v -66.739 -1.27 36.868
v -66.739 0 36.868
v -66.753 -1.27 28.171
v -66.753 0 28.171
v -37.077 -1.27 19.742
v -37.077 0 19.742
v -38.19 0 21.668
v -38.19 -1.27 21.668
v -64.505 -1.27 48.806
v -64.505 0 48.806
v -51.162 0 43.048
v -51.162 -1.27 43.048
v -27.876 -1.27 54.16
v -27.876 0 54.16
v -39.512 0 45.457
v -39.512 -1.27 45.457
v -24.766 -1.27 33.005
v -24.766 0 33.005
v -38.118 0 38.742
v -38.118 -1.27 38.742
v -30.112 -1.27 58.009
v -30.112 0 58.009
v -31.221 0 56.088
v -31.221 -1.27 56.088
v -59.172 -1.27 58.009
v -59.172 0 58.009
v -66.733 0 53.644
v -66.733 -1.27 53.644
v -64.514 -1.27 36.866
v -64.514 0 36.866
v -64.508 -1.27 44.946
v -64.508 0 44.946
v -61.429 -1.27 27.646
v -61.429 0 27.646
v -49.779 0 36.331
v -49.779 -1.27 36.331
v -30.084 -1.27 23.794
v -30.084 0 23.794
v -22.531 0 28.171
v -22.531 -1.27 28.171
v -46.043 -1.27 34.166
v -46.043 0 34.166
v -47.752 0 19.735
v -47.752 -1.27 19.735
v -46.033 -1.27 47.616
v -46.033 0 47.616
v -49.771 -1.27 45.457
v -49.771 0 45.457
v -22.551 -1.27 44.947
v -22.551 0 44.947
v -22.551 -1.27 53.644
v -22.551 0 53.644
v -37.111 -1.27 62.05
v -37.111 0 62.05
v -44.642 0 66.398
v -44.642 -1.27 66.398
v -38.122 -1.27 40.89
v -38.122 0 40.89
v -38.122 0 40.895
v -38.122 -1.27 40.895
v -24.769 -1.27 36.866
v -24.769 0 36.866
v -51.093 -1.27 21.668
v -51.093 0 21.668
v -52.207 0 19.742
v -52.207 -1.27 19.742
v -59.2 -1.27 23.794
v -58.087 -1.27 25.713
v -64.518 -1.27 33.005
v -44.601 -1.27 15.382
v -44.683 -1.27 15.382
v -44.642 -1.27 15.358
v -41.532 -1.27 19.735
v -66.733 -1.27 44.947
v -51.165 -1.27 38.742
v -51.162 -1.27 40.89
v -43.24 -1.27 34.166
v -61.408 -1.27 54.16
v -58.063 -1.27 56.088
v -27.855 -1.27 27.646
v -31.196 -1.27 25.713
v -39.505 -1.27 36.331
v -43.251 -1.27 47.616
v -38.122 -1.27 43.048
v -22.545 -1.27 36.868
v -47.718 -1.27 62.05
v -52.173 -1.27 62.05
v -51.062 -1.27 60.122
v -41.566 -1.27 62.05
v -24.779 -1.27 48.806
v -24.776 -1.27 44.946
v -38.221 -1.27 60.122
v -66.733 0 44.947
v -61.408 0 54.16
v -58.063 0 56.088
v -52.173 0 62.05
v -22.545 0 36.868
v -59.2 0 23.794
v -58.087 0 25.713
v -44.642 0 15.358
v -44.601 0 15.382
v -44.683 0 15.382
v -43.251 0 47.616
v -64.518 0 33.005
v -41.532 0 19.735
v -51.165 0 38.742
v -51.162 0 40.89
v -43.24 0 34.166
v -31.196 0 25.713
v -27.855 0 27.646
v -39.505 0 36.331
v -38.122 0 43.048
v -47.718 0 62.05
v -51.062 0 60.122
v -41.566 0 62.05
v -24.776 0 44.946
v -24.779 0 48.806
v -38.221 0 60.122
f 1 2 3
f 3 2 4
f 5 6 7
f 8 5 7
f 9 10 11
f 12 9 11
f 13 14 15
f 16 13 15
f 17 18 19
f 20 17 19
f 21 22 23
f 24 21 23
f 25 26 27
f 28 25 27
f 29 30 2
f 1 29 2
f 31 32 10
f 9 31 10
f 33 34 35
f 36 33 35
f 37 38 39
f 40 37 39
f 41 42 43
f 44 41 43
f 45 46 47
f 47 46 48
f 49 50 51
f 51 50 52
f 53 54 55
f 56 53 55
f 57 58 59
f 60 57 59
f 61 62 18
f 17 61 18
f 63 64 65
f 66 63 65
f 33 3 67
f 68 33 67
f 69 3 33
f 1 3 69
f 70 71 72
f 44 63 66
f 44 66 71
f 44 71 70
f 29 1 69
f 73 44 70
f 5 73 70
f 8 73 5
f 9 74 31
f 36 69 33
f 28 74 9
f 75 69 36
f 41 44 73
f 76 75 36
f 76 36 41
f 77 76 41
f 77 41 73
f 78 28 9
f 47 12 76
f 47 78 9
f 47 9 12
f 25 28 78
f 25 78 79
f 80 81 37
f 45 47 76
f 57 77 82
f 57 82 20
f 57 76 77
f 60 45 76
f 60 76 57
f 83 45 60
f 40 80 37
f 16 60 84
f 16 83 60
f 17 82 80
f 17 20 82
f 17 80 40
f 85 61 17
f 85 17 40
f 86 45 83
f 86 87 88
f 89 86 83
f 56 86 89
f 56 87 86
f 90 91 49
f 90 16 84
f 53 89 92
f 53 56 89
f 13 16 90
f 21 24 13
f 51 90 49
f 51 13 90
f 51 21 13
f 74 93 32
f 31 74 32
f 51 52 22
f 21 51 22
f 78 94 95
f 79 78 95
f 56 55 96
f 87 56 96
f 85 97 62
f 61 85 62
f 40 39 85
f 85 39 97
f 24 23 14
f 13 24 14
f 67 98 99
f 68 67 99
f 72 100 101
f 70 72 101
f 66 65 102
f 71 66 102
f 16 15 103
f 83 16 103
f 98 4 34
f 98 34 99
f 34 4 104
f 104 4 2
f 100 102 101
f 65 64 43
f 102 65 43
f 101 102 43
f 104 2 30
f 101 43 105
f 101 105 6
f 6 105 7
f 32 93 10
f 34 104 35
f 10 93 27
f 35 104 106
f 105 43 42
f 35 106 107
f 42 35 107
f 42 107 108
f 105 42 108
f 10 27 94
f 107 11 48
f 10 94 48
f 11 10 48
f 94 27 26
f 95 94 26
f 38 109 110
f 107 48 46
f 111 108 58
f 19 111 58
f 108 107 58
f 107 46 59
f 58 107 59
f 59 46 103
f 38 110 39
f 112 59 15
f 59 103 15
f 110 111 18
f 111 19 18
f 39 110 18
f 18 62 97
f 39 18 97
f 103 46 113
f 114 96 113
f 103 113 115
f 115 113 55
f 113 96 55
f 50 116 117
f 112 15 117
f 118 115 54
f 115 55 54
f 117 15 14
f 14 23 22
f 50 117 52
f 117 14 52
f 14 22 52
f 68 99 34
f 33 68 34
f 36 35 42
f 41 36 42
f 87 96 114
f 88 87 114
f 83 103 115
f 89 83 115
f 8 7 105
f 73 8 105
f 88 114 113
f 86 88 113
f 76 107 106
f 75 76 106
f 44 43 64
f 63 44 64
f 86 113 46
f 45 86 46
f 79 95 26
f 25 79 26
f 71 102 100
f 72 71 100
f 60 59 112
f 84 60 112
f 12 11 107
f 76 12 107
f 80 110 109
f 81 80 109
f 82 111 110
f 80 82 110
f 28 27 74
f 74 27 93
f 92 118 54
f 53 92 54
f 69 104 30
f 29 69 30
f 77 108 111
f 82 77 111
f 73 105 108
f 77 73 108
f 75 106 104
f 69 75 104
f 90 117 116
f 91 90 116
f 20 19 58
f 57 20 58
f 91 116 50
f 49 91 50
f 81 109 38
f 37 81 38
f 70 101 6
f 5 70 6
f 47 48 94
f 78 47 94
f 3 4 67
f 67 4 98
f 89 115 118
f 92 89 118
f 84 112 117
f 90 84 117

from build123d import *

# Parameters (mm, degrees)
F1_DEPTH = 1.27


# Not quite as in the source:
# - ends of sketch curves that miss each other by under 0.0002 mm in the source are joined


with BuildPart() as f1:
    # F0 (on Front) → F1 (new body)
    with BuildSketch(Plane.XZ):
        Polygon((-44.6418710053, 40.8897735178), (-44.6418710053, 33.3539977979), (-44.6297971524, 33.3609944811), (-43.2404409197, 34.166113231), (-39.5050764062, 36.3307215128), (-38.1157201735, 37.1358402628), (-38.1182953477, 38.7416174302), (-38.1217403313, 40.8897735313), (-38.1217487156, 40.8950016529), align=None)
        Polygon((-44.6539448582, 33.3609944811), (-44.6418710053, 33.3539977979), (-44.6418710053, 40.8897735178), (-51.161993295, 40.8950016529), (-51.161993295, 40.8897735178), (-51.1654466629, 38.7416174302), (-51.1680218371, 37.1358402628), (-49.7786656044, 36.3307215128), (-46.0433010909, 34.166113231), align=None)
        Polygon((-44.6418710053, 40.8897735178), (-38.1217487156, 40.8950016529), (-38.1217487156, 40.9002297812), (-38.1217487156, 43.0483886446), (-38.1217487156, 44.6541678769), (-39.5123943237, 45.4570574931), (-43.2512253972, 47.6156726199), (-44.6418710053, 48.418562236), align=None)
        Polygon((-51.161993295, 40.8950016529), (-44.6418710053, 40.8897735178), (-44.6418710053, 48.418562236), (-46.0325166134, 47.6156726199), (-49.7713476869, 45.4570574931), (-51.161993295, 44.6541678769), (-51.161993295, 43.0483886446), (-51.161993295, 40.9002297812), align=None)
        Polygon((-41.5661535928, 62.0498394063), (-44.6418710053, 63.8223188678), (-44.6418710053, 48.418562236), (-43.2512253972, 47.6156726199), align=None)
        Polygon((-44.6418710053, 48.418562236), (-44.6418710053, 63.8223188678), (-47.7175884178, 62.0498394063), (-46.0325166134, 47.6156726199), align=None)
        Polygon((-37.1105166727, 62.0498394063), (-44.6418710053, 66.3980688576), (-44.6418710053, 63.8223188678), (-41.5661535928, 62.0498394063), (-38.2213332575, 60.1222808724), align=None)
        Polygon((-44.6418710053, 63.8223188678), (-44.6418710053, 66.3980688576), (-52.1732253379, 62.0498394063), (-51.0624087531, 60.1222808724), (-47.7175884178, 62.0498394063), align=None)
        Polygon((-24.7788576939, 48.806157048), (-24.7757621839, 44.9456783996), (-22.5510392338, 44.9474622851), (-22.5510392338, 53.6439211877), (-30.1115337683, 58.0089747424), (-31.2206558067, 56.0879190201), (-27.8758354714, 54.1603604862), (-24.7817211845, 52.3772792439), align=None)
        Polygon((-38.1217487156, 43.0483886446), (-24.7788576939, 48.806157048), (-24.7817211845, 52.3772792439), (-27.8758354714, 54.1603604862), (-39.5123943237, 45.4570574931), (-38.1217487156, 44.6541678769), align=None)
        Polygon((-22.5445603606, 36.8675168429), (-24.7692833106, 36.8657329574), (-24.7661878006, 33.0052543089), (-24.76332431, 29.4341321131), (-27.8545751064, 27.6460911595), (-31.1962999317, 25.713171045), (-30.0840985392, 23.7938964823), (-22.5306139252, 28.1710691232), align=None)
        Polygon((-24.76332431, 29.4341321131), (-24.7661878006, 33.0052543089), (-38.1182953477, 38.7416174302), (-38.1157201735, 37.1358402628), (-39.5050764062, 36.3307215128), (-27.8545751064, 27.6460911595), align=None)
        Polygon((-44.6827784364, 15.3815109795), (-44.6418710053, 15.3578055115), (-44.6418710053, 33.3539977979), (-44.6539448582, 33.3609944811), (-46.0433010909, 34.166113231), (-47.7515186761, 19.7346673406), (-51.0932435014, 21.6675874551), (-52.2071498666, 19.7418128067), align=None)
        Polygon((-44.6418710053, 33.3539977979), (-44.6418710053, 15.3578055115), (-44.6009635742, 15.3815109795), (-37.076592144, 19.7418128067), (-38.1904985092, 21.6675874551), (-41.5322233345, 19.7346673406), (-43.2404409197, 34.166113231), (-44.6297971524, 33.3609944811), align=None)
        Polygon((-51.1654466629, 38.7416174302), (-64.5175542099, 33.0052543089), (-64.5204177006, 29.4341321131), (-61.4291669042, 27.6460911595), (-49.7786656044, 36.3307215128), (-51.1680218371, 37.1358402628), align=None)
        Polygon((-64.5144587, 36.8657329574), (-66.73918165, 36.8675168429), (-66.7531280854, 28.1710691232), (-59.1996434714, 23.7938964823), (-58.0874420789, 25.713171045), (-61.4291669042, 27.6460911595), (-64.5204177006, 29.4341321131), (-64.5175542099, 33.0052543089), align=None)
        Polygon((-64.5020208261, 52.3772792439), (-64.5048843167, 48.806157048), (-51.161993295, 43.0483886446), (-51.161993295, 44.6541678769), (-49.7713476869, 45.4570574931), (-61.4079065392, 54.1603604862), align=None)
        Polygon((-58.0630862039, 56.0879190201), (-59.1722082423, 58.0089747424), (-66.7327027768, 53.6439211877), (-66.7327027768, 44.9474622851), (-64.5079798267, 44.9456783996), (-64.5048843167, 48.806157048), (-64.5020208261, 52.3772792439), (-61.4079065392, 54.1603604862), align=None)
    extrude(amount=F1_DEPTH)


solid = f1.part
